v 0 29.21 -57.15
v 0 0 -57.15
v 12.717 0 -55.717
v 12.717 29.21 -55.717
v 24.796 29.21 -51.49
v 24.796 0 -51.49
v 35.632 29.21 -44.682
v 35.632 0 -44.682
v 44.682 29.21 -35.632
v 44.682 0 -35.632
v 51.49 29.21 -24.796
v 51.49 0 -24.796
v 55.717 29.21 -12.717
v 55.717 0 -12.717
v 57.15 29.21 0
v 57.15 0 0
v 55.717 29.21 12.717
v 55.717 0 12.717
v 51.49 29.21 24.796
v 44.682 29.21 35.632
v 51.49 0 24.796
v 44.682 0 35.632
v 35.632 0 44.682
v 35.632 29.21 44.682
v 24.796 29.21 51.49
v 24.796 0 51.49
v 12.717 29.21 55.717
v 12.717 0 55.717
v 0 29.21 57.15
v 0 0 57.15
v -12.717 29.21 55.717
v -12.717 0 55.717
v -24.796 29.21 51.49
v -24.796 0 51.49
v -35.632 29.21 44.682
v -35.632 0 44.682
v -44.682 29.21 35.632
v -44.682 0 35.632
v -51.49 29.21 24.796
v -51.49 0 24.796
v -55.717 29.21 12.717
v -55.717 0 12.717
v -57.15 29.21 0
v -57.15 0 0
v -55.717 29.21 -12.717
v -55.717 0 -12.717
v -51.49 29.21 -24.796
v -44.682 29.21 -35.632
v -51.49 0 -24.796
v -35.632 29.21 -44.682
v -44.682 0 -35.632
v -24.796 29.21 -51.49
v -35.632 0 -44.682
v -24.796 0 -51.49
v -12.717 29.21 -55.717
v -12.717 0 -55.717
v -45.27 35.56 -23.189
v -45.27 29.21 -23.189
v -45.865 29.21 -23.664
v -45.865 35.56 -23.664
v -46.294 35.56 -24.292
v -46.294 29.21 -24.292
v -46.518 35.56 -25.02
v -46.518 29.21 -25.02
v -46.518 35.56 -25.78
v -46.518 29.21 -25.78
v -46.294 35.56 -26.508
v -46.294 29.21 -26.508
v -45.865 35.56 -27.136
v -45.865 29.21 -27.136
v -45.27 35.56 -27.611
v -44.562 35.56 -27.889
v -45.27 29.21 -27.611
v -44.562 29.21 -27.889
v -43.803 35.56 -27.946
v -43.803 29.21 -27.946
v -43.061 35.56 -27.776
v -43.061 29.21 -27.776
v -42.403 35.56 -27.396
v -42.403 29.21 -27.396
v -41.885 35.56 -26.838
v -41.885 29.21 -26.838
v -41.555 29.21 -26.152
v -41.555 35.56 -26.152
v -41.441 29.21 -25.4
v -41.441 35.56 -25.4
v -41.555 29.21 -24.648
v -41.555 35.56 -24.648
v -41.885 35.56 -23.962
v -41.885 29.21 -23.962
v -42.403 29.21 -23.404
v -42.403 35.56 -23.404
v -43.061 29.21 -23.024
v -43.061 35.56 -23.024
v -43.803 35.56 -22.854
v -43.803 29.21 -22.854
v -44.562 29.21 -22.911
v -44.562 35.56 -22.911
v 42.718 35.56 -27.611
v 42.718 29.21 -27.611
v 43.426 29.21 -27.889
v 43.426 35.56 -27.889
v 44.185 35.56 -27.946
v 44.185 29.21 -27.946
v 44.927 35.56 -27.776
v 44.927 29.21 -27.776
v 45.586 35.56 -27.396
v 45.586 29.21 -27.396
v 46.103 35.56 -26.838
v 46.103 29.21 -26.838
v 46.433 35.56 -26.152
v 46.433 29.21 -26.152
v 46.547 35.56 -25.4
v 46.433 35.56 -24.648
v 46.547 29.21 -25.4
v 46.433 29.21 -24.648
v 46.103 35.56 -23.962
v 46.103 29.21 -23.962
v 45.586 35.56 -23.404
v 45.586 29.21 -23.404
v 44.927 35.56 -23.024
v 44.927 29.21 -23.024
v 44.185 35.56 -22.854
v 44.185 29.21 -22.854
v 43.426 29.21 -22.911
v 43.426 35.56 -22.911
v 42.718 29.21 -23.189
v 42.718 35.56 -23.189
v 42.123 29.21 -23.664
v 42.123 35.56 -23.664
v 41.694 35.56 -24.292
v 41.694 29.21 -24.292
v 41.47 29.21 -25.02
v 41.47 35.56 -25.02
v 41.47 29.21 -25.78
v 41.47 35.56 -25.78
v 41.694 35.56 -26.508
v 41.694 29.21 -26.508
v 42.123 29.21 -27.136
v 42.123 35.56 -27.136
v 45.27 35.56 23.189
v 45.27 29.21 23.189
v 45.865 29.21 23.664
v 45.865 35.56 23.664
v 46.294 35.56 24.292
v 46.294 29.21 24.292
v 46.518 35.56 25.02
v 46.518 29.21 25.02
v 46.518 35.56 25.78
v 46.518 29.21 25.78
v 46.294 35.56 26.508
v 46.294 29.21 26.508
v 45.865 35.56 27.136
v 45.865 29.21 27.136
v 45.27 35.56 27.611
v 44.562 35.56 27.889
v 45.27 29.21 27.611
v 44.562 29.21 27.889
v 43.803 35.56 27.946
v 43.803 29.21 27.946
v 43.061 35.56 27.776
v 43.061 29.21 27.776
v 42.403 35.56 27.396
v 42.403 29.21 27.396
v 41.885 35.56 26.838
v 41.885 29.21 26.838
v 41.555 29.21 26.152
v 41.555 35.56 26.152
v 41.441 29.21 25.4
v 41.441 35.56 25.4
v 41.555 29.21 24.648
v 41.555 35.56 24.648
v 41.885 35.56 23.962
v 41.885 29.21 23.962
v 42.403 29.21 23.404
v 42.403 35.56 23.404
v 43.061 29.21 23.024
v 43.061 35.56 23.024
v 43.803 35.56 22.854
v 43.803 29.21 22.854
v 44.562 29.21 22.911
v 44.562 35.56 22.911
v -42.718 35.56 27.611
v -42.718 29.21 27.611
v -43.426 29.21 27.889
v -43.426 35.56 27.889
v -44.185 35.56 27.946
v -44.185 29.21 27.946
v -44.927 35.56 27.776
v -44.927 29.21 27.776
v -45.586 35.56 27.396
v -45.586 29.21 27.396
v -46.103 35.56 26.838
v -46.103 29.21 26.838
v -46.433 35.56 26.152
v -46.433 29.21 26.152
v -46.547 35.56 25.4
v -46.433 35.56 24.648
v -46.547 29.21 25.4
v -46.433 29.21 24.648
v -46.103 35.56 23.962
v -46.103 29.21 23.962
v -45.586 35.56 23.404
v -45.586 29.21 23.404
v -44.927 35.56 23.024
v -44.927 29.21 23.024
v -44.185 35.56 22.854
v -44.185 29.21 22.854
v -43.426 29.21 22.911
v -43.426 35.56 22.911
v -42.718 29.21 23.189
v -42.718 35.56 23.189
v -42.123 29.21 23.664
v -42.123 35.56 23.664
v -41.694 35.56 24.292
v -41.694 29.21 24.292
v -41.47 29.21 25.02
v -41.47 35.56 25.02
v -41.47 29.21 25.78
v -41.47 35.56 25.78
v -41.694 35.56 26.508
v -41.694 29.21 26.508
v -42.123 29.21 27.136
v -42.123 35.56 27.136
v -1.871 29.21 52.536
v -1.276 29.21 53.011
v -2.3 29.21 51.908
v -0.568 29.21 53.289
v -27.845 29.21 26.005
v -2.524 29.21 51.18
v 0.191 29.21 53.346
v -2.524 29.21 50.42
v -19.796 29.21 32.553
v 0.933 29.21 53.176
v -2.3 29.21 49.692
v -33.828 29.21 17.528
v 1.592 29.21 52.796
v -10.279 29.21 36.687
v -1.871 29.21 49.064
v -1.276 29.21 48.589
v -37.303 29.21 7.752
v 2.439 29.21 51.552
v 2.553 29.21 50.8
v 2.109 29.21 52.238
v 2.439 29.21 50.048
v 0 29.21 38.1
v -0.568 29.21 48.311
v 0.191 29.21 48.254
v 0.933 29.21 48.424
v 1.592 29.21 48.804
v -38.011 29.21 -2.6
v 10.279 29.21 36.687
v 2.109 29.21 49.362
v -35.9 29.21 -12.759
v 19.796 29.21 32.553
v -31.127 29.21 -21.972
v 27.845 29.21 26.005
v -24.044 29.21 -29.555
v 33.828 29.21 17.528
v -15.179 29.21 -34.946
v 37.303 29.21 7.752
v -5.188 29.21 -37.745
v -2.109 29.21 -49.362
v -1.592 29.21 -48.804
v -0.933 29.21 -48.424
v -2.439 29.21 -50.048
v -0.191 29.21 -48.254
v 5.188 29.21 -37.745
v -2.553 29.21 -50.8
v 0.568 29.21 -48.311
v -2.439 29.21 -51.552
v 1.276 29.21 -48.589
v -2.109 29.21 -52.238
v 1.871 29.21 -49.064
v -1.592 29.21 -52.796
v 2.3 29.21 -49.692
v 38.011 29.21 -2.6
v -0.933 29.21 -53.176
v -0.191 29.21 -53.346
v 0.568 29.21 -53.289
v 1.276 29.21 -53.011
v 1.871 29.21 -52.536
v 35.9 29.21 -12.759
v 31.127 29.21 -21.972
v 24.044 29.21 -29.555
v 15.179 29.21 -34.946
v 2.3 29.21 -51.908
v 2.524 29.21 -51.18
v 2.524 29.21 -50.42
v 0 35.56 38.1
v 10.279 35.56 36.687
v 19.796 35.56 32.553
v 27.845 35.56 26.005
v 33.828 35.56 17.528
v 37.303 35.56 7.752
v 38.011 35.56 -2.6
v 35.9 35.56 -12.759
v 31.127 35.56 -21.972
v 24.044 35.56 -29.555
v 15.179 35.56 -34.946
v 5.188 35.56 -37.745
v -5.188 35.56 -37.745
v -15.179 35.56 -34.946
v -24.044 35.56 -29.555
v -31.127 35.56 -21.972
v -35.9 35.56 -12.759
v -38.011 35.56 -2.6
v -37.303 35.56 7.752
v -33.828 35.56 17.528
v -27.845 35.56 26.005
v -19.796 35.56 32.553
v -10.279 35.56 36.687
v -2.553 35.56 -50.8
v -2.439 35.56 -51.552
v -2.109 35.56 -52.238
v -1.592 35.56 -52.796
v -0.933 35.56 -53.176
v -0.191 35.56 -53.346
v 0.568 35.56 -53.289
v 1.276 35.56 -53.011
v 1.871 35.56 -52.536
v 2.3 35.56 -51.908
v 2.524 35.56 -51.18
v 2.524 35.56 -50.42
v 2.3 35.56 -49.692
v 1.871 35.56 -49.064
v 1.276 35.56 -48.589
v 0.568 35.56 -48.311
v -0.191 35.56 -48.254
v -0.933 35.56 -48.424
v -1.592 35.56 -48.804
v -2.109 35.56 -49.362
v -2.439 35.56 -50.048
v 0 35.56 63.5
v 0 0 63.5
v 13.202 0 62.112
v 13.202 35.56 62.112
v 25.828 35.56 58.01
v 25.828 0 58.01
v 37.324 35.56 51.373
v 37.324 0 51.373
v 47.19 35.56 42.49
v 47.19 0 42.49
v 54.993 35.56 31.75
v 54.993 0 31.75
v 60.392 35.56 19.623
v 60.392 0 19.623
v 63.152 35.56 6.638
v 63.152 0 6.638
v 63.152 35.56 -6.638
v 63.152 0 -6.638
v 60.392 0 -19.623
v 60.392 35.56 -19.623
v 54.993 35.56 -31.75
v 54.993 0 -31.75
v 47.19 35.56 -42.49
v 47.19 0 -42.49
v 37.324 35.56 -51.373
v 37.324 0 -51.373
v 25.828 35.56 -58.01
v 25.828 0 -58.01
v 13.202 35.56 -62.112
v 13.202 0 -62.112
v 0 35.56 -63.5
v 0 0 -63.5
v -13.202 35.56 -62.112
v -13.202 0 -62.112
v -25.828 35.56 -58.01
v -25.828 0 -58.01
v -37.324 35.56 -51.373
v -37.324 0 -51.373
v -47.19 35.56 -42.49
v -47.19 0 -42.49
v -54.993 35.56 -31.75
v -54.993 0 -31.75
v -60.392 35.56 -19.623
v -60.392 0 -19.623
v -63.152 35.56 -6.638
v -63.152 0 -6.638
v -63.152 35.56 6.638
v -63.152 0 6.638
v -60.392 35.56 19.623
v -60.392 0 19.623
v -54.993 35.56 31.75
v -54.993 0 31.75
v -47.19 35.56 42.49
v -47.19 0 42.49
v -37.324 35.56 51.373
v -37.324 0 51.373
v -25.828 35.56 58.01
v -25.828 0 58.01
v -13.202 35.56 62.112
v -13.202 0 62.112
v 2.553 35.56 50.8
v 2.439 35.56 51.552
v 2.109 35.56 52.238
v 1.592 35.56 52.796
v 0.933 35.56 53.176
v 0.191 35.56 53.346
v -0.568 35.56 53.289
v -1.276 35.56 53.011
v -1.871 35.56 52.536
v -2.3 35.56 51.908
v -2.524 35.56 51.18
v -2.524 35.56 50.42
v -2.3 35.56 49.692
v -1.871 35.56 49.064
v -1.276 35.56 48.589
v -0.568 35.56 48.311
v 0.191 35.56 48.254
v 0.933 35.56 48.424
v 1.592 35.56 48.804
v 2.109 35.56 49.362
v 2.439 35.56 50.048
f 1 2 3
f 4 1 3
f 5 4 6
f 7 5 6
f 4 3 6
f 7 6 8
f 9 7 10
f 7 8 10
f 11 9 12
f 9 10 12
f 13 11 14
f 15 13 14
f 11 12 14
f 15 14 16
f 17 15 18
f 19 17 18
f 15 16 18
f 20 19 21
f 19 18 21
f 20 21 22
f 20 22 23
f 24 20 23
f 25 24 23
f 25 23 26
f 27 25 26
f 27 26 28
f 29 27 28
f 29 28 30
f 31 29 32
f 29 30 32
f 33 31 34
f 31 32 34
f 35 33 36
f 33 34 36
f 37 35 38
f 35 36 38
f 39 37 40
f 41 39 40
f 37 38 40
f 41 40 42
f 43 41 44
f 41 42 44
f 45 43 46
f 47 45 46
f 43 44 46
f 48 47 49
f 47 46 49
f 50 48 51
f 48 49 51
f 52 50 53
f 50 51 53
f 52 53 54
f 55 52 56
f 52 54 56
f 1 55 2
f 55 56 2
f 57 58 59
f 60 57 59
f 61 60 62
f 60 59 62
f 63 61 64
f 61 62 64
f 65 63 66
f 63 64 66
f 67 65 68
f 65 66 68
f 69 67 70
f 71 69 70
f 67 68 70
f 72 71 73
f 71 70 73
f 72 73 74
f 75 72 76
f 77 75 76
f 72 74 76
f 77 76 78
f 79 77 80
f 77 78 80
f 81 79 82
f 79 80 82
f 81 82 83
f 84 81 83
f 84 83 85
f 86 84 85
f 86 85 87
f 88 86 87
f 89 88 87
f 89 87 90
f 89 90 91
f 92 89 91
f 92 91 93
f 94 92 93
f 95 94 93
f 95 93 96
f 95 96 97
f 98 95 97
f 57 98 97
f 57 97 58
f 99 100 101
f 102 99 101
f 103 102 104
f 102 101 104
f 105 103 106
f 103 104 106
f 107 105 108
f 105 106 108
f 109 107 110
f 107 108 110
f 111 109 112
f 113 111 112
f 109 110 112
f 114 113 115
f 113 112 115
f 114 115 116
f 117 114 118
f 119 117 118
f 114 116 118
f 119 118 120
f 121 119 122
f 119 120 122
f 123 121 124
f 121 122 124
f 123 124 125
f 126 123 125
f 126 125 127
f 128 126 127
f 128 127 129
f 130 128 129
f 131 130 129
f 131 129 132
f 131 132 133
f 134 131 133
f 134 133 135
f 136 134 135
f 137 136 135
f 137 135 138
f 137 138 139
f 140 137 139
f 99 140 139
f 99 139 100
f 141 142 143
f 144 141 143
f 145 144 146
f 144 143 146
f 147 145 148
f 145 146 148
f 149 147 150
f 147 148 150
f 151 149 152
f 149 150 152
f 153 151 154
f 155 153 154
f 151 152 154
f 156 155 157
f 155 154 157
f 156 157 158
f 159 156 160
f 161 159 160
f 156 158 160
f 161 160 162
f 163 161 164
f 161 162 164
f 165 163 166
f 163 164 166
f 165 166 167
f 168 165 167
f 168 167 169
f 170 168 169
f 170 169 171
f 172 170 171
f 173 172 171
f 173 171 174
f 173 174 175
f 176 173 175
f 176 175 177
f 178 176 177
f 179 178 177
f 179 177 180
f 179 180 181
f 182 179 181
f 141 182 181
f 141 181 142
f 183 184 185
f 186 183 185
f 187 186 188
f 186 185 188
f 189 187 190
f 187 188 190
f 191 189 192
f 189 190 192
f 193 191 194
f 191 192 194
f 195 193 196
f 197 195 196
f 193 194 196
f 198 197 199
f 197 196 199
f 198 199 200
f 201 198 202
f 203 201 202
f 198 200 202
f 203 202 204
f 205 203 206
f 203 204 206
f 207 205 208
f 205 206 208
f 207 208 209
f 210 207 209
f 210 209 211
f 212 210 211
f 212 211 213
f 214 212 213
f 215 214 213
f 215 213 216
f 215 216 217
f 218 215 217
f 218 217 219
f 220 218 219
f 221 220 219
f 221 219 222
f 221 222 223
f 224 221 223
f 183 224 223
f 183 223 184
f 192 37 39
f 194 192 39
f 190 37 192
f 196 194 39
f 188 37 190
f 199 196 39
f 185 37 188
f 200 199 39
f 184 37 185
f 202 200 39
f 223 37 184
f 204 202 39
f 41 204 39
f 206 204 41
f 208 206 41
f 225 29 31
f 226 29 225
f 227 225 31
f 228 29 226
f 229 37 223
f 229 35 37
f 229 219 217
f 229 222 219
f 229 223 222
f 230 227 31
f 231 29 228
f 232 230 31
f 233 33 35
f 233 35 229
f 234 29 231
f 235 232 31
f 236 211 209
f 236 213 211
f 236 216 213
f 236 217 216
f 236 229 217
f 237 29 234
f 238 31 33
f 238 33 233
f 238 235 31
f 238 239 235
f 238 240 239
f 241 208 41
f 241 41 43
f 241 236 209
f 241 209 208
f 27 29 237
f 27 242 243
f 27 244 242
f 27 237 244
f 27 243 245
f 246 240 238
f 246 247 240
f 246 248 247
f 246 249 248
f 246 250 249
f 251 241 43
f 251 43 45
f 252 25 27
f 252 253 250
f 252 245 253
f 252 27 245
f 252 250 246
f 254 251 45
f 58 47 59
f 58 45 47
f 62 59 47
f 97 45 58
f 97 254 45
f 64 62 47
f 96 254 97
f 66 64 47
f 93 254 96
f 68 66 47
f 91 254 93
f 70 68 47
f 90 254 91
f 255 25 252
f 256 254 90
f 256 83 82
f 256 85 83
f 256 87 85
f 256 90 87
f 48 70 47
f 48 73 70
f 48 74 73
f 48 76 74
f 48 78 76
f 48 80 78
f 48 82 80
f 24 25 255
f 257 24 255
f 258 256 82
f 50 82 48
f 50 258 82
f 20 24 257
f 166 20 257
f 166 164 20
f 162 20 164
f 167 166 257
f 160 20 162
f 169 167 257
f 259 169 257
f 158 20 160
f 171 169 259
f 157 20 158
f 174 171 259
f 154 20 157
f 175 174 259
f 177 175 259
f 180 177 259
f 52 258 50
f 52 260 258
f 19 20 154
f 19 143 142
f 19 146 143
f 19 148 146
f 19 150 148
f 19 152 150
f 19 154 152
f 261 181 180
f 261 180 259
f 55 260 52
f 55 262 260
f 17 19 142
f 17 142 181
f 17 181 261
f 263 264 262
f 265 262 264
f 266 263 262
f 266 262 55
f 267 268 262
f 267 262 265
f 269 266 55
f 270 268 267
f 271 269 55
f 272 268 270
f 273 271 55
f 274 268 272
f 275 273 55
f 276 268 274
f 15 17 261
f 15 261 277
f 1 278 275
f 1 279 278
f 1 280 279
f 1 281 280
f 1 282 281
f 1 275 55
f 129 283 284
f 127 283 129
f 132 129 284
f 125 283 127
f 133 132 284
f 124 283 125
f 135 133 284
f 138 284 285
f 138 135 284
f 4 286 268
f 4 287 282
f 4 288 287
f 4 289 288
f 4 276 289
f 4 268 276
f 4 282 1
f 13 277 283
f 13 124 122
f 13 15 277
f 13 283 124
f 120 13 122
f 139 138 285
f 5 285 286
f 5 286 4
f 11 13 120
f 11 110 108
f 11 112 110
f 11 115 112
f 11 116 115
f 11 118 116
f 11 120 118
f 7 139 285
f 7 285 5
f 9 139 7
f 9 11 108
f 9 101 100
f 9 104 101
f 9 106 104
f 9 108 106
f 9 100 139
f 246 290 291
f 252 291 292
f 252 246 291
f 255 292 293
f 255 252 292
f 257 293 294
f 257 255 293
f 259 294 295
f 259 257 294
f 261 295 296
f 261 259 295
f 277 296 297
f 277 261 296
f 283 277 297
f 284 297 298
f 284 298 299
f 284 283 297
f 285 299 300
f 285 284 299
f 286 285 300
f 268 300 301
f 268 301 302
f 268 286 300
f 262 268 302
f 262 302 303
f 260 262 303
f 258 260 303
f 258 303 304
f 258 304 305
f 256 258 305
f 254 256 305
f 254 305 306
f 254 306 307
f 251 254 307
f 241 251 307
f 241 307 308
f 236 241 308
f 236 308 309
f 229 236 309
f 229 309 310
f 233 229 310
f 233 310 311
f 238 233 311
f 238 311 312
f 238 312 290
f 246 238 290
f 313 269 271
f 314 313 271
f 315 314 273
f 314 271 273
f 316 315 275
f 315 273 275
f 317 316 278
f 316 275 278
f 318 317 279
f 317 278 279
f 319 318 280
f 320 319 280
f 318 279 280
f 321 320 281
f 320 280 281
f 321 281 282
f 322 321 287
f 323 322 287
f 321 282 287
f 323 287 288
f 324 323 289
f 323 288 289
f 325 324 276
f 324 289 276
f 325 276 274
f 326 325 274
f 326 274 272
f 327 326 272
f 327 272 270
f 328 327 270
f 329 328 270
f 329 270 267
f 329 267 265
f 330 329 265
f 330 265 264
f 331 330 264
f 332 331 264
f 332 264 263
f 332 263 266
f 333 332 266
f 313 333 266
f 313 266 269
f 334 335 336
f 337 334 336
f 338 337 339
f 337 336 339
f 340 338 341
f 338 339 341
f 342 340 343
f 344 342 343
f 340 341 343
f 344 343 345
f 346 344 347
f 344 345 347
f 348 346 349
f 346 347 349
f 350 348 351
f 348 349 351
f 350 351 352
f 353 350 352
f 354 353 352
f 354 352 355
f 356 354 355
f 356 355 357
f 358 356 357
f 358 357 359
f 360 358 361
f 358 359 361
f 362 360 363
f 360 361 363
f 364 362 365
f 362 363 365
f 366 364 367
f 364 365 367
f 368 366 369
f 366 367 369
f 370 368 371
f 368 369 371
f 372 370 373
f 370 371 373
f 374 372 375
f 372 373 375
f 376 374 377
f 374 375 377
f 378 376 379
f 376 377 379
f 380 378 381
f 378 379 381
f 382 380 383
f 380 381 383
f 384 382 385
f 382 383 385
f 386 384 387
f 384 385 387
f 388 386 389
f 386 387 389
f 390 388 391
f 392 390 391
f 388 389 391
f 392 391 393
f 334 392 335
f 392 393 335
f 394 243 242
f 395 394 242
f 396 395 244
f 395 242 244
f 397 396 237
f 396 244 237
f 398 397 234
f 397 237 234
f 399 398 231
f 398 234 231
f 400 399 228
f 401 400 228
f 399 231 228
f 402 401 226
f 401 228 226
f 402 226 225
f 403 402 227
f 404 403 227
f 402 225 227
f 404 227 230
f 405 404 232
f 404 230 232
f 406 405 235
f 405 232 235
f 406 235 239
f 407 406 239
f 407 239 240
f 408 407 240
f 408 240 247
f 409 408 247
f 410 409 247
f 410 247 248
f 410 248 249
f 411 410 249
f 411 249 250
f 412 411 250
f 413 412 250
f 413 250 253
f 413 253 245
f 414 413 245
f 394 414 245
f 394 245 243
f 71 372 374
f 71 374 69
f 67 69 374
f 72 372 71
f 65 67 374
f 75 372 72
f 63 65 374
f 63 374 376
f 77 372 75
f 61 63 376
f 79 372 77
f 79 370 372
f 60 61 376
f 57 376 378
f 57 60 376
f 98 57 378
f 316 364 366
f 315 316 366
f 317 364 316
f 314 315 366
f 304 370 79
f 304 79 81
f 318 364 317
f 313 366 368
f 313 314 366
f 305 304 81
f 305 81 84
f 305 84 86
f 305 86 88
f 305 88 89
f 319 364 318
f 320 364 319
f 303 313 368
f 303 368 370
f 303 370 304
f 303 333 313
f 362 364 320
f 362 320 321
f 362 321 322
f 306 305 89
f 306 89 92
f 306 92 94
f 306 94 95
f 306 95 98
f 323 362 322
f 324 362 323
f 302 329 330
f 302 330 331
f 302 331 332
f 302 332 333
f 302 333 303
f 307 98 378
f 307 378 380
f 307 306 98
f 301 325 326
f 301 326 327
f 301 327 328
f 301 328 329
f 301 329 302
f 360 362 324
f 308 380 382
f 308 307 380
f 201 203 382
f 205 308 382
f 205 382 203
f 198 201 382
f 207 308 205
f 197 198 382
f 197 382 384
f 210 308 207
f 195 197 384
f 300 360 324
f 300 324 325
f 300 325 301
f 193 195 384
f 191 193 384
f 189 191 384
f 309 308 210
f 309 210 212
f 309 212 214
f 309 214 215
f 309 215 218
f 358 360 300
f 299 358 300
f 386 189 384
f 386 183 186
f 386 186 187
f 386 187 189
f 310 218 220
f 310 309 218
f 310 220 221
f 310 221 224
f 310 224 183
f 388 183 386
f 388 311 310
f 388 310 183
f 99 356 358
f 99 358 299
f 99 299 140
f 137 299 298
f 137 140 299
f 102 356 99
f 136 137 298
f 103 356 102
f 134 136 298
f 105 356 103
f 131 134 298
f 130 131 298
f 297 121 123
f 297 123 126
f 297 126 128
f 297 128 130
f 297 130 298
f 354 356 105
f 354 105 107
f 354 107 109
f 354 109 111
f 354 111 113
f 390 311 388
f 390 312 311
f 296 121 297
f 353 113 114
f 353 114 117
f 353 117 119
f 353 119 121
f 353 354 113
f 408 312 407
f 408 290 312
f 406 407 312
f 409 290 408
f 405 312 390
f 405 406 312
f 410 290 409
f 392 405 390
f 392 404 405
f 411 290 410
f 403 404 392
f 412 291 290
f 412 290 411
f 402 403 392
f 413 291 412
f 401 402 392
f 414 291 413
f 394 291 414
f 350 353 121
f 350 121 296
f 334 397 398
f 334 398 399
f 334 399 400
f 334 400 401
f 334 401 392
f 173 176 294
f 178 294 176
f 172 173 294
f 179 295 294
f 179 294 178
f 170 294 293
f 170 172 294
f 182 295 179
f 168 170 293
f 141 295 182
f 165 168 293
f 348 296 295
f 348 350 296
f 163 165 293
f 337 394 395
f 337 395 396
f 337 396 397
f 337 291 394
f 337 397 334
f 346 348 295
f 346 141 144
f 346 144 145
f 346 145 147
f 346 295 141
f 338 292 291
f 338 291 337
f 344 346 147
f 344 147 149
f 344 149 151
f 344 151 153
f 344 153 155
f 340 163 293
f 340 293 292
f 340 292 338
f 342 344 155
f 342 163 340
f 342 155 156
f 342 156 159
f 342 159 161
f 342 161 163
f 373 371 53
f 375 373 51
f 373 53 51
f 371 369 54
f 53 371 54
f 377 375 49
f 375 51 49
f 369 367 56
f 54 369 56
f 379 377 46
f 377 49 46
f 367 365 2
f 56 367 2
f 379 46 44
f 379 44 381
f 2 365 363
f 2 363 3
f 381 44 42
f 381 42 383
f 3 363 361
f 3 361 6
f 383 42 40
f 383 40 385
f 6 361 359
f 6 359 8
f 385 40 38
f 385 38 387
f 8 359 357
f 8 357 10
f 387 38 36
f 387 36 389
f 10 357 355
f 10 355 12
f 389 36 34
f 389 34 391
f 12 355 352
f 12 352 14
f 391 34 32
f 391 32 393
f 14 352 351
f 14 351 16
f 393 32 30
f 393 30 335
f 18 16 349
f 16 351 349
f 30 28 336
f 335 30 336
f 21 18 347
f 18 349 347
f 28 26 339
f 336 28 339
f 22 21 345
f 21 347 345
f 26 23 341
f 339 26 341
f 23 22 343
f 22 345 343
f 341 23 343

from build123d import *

# Parameters (mm, degrees)
SKETCH1_R              = 63.5
SKETCH1_R_2            = 38.1
BOSS_EXTRUDE1_DEPTH    = 35.56
SKETCH2_R              = 57.15
CUT_EXTRUDE1_DEPTH     = 29.21
F_10_CLEARANCE_HOLE1_D = 5.1054
CIRPATTERN1_COUNT      = 6


with BuildPart() as part:
    # Sketch1 → Boss-Extrude1 (new body)
    with BuildSketch(Plane(origin=(0, 0, 0), x_dir=(1, 0, 0), z_dir=(0, 1, 0))):
        with Locations(Location((0, 0, 0), (0, 0, 270))):
            Circle(SKETCH1_R)
        with Locations(Location((0, 0, 0), (0, 0, 270))):
            Circle(SKETCH1_R_2, mode=Mode.SUBTRACT)
    extrude(amount=BOSS_EXTRUDE1_DEPTH)

    # Sketch2 → Cut-Extrude1 (cut)
    with BuildSketch(Plane.XZ):
        with Locations(Location((0, 0, 0), (0, 0, 270))):
            Circle(SKETCH2_R)
    extrude(amount=-CUT_EXTRUDE1_DEPTH, mode=Mode.SUBTRACT)

    # #10 Clearance Hole1 (through all)
    with Locations(Plane(origin=(0, 35.56, 0), x_dir=(1, 0, 0), z_dir=(0, 1, 0))):
        with Locations((0, 50.8)):
            f_10_clearance_hole1 = Hole(F_10_CLEARANCE_HOLE1_D / 2)

    # CirPattern1: #10 Clearance Hole1 ×6 about axis
    cirpattern1_axis = Axis((0, 0, 0), (0, 1, 0))
    for i in range(1, CIRPATTERN1_COUNT):
        add(f_10_clearance_hole1.rotate(cirpattern1_axis, i * 360 / CIRPATTERN1_COUNT), mode=Mode.SUBTRACT)


solid = part.part
